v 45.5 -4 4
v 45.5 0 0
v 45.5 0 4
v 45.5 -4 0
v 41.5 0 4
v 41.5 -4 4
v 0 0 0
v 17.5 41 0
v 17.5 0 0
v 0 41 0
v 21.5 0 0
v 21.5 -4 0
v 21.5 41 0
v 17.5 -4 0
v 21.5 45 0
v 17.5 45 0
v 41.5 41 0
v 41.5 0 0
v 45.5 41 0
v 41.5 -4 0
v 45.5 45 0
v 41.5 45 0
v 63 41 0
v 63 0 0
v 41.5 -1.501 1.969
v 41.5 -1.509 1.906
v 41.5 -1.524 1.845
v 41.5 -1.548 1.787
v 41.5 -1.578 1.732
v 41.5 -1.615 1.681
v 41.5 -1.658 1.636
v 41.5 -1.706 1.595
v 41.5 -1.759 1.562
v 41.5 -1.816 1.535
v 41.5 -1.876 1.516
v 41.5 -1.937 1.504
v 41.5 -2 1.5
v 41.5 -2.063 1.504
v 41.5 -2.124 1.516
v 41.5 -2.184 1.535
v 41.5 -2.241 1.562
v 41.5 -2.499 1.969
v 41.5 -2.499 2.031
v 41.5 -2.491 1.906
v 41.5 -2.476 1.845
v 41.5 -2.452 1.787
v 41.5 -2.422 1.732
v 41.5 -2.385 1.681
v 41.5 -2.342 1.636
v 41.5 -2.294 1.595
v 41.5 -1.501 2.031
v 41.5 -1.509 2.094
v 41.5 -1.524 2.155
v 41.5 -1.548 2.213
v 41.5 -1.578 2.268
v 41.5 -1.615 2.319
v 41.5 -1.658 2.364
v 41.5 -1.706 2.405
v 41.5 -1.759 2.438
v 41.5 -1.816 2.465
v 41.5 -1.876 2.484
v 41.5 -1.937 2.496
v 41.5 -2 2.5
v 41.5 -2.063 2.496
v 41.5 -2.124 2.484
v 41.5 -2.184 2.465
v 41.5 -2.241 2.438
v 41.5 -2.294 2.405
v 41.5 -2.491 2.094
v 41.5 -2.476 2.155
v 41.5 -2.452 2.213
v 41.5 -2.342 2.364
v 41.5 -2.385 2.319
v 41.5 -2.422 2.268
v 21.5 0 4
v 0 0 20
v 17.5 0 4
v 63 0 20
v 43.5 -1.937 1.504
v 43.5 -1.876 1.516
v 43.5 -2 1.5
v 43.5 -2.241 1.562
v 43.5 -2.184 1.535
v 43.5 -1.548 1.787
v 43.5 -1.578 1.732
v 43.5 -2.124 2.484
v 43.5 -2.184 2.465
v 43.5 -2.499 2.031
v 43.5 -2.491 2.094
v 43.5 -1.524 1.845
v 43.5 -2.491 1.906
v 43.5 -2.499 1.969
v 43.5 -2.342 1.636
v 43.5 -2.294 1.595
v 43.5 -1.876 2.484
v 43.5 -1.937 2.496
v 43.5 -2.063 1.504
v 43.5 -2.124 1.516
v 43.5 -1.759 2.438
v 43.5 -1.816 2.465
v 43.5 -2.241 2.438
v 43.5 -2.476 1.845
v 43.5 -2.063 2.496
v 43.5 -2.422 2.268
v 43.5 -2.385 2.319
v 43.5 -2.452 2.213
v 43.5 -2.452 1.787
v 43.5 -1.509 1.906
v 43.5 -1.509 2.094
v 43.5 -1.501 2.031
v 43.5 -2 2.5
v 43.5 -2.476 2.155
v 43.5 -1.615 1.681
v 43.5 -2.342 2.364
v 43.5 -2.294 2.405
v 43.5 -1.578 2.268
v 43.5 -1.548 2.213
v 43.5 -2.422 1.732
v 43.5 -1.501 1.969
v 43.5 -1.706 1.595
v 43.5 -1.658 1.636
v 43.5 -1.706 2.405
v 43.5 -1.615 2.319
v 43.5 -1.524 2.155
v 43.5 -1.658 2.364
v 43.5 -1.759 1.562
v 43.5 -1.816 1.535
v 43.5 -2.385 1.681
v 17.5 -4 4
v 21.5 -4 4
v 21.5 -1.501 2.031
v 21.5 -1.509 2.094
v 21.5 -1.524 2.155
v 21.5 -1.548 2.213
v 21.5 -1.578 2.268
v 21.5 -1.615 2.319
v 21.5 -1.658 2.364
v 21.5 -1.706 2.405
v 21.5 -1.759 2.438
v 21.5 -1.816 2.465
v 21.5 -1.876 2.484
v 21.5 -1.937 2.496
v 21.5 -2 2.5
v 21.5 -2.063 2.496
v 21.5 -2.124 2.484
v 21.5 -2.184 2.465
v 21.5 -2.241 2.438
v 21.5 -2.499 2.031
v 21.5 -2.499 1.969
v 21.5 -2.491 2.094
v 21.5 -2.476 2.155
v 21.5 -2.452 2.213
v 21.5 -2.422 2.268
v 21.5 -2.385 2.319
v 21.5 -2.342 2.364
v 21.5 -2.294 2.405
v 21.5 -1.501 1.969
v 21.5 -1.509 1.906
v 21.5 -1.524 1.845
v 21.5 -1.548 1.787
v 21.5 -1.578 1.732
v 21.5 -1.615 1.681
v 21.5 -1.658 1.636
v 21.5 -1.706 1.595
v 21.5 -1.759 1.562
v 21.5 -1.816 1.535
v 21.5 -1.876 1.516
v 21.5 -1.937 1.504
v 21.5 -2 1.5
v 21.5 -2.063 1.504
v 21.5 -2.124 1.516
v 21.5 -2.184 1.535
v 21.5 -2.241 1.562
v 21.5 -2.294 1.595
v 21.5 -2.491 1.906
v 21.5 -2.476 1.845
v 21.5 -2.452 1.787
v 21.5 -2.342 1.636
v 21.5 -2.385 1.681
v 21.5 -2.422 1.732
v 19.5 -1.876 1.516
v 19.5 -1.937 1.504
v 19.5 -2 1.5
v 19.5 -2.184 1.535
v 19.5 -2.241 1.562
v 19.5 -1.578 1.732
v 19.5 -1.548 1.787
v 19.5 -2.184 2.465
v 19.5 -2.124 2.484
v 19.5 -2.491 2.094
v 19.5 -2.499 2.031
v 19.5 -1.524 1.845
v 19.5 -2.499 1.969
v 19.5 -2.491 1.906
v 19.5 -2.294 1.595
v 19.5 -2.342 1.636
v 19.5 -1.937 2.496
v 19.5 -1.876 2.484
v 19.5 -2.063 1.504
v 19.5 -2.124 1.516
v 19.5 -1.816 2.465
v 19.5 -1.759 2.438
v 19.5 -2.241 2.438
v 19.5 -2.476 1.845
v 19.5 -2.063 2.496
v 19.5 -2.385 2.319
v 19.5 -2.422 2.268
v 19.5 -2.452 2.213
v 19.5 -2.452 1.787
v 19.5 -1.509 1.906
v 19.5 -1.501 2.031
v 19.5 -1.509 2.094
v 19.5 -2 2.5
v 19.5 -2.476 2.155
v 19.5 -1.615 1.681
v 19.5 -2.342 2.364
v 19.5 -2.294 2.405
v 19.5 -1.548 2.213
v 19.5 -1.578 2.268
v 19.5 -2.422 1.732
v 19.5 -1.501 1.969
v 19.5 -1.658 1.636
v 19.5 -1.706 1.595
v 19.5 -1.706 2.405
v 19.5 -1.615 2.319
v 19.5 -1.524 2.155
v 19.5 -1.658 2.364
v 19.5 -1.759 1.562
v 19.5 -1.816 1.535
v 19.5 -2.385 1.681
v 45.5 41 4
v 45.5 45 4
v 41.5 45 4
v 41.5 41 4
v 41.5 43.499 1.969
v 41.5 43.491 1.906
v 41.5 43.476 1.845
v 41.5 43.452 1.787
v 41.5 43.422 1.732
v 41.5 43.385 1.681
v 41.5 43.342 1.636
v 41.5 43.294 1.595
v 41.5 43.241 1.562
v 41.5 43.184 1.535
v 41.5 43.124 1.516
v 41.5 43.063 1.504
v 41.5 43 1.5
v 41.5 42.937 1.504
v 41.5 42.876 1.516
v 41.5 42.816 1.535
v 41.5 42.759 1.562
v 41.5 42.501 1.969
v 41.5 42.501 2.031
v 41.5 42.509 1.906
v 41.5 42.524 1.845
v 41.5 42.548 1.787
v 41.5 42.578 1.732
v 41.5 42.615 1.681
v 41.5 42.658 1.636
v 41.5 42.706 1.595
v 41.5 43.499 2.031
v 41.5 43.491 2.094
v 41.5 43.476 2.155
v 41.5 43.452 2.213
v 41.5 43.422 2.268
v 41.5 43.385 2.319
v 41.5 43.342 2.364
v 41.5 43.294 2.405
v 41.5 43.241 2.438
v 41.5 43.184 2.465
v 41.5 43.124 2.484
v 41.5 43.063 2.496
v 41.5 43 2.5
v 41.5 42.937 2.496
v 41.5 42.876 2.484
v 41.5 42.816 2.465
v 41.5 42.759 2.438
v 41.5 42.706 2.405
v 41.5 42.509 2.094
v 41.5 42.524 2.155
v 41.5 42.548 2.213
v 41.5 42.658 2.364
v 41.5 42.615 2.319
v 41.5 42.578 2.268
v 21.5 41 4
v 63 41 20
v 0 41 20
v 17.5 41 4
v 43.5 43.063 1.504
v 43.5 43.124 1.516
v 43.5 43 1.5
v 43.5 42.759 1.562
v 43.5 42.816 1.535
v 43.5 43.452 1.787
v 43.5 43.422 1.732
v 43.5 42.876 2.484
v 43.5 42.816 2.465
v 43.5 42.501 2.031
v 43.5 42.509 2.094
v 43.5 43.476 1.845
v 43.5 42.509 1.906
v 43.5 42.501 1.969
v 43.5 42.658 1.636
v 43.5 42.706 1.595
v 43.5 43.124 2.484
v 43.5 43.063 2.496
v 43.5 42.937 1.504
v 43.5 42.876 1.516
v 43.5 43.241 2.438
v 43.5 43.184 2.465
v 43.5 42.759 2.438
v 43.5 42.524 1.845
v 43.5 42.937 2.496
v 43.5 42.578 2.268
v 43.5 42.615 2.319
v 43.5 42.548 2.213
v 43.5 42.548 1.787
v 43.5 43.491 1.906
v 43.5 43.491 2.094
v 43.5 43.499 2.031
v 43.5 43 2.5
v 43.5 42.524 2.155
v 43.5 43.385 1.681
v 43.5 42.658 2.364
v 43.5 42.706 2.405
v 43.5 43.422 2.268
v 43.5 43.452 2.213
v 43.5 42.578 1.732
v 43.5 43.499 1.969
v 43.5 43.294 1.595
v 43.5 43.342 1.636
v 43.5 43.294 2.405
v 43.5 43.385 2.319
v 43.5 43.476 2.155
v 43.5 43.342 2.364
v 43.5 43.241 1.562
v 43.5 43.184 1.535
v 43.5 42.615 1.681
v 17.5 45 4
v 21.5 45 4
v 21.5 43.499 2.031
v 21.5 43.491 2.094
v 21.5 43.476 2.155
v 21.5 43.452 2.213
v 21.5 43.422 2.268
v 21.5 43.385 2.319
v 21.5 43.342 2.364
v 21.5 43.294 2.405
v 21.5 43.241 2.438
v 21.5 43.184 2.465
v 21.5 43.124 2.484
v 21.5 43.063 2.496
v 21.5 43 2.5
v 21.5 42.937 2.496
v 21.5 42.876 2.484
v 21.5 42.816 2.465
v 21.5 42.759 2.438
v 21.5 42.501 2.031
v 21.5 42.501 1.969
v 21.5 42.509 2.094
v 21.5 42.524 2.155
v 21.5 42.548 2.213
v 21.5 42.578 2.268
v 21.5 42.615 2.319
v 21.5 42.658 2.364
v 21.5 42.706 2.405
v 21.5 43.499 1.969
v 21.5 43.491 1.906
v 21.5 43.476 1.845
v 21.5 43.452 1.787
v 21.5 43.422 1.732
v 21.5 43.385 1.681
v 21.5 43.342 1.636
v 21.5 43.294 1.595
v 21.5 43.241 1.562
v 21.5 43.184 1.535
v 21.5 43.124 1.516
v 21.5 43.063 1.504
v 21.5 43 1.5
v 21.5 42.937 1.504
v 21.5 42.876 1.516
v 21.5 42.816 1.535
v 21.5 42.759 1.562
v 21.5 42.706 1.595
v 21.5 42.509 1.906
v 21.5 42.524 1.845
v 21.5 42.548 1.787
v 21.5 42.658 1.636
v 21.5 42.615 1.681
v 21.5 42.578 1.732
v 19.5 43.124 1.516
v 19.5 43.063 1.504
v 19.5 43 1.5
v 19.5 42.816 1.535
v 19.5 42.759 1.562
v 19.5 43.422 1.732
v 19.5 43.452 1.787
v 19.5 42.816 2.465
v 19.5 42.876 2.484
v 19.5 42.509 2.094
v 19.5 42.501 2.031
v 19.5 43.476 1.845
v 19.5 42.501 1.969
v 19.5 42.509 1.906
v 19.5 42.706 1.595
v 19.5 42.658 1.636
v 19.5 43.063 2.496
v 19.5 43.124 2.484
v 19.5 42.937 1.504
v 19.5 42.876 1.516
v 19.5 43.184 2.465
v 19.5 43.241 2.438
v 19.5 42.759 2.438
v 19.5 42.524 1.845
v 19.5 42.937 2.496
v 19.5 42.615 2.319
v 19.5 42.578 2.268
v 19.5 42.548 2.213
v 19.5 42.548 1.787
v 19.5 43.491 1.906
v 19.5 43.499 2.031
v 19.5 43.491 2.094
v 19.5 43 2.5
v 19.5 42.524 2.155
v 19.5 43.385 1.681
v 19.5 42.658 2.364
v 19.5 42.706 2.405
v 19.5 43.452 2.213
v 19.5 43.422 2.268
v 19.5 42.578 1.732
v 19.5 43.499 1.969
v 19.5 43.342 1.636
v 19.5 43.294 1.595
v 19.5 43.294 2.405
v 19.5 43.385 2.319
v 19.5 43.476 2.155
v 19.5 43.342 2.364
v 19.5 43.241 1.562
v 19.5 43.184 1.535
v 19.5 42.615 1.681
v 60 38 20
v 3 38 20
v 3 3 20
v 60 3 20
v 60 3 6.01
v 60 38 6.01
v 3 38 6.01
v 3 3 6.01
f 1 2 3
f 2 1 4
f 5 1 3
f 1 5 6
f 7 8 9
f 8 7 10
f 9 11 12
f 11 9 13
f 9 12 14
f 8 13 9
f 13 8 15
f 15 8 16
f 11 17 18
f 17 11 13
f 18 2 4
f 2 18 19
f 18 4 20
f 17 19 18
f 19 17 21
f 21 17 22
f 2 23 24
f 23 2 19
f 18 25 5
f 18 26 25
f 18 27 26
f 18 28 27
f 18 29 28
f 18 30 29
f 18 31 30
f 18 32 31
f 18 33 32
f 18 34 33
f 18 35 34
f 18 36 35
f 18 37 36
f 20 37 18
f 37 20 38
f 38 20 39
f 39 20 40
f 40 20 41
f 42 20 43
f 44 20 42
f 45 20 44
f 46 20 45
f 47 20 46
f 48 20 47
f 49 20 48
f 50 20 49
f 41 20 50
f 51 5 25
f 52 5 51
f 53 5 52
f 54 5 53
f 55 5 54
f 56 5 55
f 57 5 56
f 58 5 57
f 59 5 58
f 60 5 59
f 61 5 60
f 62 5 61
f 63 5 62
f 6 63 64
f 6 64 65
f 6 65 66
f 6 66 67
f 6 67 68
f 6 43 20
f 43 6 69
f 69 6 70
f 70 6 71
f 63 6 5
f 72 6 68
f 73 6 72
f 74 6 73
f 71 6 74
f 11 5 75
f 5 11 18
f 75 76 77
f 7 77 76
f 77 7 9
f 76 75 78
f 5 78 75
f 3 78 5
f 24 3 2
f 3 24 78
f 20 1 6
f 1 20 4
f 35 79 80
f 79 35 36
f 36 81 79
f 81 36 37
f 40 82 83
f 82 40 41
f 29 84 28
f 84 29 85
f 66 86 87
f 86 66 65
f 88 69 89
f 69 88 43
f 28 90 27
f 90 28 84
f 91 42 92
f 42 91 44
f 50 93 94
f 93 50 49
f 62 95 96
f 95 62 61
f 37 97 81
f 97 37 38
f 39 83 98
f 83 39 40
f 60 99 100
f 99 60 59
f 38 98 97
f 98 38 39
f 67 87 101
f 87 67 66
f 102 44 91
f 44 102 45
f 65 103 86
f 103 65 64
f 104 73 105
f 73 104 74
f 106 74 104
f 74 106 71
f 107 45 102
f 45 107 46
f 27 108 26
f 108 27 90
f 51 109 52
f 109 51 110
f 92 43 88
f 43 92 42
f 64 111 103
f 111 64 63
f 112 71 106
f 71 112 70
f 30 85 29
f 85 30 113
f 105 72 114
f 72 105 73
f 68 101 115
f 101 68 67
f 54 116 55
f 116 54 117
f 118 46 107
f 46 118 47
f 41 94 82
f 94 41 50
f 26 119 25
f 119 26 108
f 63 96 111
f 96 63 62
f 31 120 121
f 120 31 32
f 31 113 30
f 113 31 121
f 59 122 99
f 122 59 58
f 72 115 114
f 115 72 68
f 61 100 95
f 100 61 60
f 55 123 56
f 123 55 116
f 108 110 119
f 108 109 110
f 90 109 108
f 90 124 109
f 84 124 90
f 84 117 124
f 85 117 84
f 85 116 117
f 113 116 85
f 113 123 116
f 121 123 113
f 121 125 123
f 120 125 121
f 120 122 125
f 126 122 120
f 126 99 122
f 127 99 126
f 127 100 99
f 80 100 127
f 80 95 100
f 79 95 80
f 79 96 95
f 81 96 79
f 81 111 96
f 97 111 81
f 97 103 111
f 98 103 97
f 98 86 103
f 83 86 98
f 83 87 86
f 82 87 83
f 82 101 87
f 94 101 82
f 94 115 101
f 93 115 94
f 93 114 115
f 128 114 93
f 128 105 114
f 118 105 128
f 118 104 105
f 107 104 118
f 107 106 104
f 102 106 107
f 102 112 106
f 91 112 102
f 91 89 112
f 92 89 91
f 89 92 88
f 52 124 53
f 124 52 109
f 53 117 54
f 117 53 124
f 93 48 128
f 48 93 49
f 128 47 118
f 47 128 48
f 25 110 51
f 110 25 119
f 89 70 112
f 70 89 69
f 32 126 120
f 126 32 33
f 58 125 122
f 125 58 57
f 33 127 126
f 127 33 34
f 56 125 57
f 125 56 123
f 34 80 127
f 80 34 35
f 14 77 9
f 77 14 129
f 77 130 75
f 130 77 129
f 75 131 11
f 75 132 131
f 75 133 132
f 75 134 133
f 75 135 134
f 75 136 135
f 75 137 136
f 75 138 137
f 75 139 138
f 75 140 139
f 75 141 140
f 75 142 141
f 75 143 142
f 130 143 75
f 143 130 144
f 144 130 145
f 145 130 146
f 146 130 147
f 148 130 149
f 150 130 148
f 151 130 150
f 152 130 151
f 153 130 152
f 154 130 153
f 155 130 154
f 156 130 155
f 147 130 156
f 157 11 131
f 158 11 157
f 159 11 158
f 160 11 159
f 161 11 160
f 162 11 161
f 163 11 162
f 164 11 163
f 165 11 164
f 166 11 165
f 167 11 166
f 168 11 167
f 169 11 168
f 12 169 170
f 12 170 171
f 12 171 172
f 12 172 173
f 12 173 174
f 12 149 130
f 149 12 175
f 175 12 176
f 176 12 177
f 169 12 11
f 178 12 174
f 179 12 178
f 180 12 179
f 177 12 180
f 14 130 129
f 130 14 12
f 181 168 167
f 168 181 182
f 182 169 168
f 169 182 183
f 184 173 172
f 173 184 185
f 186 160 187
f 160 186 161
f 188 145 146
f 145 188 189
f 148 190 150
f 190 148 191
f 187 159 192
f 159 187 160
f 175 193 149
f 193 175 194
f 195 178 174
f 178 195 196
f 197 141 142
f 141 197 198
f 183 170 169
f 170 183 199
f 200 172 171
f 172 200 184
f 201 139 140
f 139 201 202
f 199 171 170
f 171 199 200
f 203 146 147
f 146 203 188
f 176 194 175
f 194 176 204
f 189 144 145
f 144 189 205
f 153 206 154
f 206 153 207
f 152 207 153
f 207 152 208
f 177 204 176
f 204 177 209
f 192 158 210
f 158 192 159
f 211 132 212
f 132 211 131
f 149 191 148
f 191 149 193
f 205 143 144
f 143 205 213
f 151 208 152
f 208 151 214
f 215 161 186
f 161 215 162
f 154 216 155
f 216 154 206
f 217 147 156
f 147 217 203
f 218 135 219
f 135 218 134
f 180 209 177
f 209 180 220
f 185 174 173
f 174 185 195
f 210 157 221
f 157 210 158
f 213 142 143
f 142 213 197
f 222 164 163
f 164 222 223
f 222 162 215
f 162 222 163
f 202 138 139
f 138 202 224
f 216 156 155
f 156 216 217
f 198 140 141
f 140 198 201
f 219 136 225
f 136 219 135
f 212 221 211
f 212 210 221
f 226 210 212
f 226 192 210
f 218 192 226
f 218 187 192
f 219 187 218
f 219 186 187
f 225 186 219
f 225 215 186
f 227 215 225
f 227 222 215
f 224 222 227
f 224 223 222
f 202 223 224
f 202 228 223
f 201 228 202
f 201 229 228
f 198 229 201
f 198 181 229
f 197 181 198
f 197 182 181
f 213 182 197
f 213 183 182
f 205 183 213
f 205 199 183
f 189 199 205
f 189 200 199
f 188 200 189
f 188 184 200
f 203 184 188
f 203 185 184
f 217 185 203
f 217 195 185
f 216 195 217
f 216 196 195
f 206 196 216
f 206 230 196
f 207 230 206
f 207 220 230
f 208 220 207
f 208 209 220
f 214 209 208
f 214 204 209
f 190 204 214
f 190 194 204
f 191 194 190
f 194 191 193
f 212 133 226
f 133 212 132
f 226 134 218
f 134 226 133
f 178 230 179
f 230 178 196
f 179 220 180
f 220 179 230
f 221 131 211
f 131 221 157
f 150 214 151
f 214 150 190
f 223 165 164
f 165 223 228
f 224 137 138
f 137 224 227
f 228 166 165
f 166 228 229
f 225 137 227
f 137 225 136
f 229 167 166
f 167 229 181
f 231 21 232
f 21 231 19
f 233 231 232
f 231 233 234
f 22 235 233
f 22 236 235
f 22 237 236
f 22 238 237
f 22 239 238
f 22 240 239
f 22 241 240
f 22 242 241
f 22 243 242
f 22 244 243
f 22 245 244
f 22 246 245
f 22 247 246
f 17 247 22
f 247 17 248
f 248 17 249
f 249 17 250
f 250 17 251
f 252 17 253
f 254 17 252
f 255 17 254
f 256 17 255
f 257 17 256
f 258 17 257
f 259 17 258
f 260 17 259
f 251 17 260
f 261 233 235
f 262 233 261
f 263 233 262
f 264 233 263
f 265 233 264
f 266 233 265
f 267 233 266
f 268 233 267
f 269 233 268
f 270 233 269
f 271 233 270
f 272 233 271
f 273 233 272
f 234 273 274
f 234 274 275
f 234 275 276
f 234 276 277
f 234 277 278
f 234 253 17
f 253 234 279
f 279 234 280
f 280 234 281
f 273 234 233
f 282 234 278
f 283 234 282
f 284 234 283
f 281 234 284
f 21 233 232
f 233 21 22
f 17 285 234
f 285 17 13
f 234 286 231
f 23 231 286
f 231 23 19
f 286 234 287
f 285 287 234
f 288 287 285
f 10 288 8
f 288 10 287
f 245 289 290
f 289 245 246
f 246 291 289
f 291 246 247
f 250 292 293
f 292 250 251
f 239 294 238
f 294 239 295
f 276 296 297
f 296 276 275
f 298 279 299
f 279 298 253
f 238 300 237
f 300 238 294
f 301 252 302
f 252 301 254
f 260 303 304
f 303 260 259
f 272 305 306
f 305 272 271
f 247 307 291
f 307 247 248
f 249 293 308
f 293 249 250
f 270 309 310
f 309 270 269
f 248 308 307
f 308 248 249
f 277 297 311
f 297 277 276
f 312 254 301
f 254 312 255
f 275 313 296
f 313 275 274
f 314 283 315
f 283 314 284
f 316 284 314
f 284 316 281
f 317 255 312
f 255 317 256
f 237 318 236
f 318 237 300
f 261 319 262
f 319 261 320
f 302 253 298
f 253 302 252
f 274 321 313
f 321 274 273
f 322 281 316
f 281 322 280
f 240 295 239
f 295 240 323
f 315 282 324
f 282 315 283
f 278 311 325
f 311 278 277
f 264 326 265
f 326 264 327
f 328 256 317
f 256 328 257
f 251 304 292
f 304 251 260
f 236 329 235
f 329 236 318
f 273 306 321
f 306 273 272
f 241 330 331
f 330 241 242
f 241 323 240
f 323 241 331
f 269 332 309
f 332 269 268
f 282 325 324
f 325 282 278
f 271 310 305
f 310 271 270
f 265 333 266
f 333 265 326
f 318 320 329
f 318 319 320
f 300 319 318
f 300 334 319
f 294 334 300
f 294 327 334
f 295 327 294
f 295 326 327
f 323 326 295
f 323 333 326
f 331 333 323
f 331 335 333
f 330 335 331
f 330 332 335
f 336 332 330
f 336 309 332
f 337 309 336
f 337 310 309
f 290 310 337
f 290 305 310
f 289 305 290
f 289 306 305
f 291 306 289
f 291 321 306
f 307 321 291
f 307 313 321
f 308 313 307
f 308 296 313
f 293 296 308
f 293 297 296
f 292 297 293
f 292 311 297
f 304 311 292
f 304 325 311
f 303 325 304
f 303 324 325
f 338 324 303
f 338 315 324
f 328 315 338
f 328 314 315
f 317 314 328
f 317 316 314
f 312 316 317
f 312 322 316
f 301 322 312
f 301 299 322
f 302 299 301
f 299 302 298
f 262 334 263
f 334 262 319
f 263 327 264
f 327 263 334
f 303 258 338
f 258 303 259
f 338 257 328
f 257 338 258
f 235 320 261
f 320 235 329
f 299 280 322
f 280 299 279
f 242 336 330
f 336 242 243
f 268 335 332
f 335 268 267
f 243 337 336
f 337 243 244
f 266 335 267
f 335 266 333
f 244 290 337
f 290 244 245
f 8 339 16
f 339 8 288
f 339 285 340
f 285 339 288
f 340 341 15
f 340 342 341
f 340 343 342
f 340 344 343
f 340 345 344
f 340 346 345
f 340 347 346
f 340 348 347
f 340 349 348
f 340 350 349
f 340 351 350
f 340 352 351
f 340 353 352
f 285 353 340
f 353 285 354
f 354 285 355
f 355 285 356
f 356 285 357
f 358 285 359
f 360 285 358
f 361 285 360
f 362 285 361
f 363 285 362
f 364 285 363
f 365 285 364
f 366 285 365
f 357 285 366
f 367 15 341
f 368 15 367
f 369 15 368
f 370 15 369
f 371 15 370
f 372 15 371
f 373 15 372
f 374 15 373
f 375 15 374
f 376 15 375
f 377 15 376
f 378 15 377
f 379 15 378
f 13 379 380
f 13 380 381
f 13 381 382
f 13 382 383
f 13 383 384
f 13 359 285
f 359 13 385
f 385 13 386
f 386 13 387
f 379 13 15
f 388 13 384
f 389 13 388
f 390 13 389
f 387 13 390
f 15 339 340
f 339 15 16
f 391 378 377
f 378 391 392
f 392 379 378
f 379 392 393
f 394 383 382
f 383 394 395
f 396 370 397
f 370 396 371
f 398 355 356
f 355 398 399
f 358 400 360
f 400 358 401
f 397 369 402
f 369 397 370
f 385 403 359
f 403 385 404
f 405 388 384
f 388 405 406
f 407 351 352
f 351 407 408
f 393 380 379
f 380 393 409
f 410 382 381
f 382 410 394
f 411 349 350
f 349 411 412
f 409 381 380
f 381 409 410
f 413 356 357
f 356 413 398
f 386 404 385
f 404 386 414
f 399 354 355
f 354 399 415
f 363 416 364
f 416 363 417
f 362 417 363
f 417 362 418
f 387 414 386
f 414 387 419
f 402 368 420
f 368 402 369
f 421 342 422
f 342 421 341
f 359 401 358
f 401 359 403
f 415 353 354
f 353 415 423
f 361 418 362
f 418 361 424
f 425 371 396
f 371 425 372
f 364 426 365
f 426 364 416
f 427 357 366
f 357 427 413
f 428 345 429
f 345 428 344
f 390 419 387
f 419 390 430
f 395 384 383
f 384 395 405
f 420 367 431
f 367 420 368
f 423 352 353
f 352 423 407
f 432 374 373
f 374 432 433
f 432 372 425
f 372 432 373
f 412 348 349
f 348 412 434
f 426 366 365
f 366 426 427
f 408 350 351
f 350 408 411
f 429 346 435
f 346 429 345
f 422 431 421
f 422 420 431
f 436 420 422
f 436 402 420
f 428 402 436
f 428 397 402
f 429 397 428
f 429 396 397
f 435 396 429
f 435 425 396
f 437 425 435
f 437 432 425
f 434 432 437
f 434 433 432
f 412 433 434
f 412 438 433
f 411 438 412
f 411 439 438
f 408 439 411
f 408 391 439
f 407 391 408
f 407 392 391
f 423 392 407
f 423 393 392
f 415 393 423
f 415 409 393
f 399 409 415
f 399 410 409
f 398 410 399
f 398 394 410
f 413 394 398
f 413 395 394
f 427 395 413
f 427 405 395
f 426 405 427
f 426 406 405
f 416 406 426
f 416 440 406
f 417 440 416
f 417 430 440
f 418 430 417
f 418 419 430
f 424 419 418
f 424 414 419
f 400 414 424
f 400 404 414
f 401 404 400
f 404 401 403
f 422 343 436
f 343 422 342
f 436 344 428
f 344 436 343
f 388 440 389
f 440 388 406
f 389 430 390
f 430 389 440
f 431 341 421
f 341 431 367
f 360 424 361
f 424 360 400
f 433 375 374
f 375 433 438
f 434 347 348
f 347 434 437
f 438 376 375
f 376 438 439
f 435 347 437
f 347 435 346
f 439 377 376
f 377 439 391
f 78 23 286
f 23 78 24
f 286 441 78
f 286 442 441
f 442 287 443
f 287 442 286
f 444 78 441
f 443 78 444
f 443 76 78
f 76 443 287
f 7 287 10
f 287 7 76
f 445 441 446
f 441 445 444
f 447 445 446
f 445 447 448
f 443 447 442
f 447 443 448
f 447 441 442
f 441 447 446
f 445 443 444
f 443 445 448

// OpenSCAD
// Used to prevent 3D geometries that would have zero thickness
nothing = 0.01;


wall_thickness = 3;

pcb_width = 35;
pcb_length = 57;

inner_width  = pcb_width;
inner_length = pcb_length;

outer_width = inner_width + wall_thickness * 2;
outer_length = inner_length + wall_thickness * 2;

outer_depth = 20;
inner_depth  = outer_depth  - wall_thickness * 2;

// A set of two spaced nubs that can hold a watch pin
module watch_nubs(strap_width=20, nub_size=[4, 4, 4], pin_hole_diameter=1) {
    module nub() {
        translate([strap_width/2, 0, 0])
        difference() {
            cube(nub_size);
            translate([-nothing, nub_size[0]/2, nub_size[0]/2])
                rotate(90, [0, 1, 0])
                linear_extrude(height = nub_size[0]/2 + nothing)
                circle(d = pin_hole_diameter, $fn=50);
        }
    }
    nub();
    mirror([1, 0, 0]) nub();
}

module enclosure_body(wall_thickness=3) {
    difference(){
        cube([outer_length, outer_width, outer_depth]);
        translate([wall_thickness, wall_thickness, wall_thickness*2 + nothing])
            cube([inner_length, inner_width, inner_depth]);
    }
}

translate([outer_length/2, -4, 0])
watch_nubs();
translate([outer_length/2, outer_width, 0])
watch_nubs();
enclosure_body();
